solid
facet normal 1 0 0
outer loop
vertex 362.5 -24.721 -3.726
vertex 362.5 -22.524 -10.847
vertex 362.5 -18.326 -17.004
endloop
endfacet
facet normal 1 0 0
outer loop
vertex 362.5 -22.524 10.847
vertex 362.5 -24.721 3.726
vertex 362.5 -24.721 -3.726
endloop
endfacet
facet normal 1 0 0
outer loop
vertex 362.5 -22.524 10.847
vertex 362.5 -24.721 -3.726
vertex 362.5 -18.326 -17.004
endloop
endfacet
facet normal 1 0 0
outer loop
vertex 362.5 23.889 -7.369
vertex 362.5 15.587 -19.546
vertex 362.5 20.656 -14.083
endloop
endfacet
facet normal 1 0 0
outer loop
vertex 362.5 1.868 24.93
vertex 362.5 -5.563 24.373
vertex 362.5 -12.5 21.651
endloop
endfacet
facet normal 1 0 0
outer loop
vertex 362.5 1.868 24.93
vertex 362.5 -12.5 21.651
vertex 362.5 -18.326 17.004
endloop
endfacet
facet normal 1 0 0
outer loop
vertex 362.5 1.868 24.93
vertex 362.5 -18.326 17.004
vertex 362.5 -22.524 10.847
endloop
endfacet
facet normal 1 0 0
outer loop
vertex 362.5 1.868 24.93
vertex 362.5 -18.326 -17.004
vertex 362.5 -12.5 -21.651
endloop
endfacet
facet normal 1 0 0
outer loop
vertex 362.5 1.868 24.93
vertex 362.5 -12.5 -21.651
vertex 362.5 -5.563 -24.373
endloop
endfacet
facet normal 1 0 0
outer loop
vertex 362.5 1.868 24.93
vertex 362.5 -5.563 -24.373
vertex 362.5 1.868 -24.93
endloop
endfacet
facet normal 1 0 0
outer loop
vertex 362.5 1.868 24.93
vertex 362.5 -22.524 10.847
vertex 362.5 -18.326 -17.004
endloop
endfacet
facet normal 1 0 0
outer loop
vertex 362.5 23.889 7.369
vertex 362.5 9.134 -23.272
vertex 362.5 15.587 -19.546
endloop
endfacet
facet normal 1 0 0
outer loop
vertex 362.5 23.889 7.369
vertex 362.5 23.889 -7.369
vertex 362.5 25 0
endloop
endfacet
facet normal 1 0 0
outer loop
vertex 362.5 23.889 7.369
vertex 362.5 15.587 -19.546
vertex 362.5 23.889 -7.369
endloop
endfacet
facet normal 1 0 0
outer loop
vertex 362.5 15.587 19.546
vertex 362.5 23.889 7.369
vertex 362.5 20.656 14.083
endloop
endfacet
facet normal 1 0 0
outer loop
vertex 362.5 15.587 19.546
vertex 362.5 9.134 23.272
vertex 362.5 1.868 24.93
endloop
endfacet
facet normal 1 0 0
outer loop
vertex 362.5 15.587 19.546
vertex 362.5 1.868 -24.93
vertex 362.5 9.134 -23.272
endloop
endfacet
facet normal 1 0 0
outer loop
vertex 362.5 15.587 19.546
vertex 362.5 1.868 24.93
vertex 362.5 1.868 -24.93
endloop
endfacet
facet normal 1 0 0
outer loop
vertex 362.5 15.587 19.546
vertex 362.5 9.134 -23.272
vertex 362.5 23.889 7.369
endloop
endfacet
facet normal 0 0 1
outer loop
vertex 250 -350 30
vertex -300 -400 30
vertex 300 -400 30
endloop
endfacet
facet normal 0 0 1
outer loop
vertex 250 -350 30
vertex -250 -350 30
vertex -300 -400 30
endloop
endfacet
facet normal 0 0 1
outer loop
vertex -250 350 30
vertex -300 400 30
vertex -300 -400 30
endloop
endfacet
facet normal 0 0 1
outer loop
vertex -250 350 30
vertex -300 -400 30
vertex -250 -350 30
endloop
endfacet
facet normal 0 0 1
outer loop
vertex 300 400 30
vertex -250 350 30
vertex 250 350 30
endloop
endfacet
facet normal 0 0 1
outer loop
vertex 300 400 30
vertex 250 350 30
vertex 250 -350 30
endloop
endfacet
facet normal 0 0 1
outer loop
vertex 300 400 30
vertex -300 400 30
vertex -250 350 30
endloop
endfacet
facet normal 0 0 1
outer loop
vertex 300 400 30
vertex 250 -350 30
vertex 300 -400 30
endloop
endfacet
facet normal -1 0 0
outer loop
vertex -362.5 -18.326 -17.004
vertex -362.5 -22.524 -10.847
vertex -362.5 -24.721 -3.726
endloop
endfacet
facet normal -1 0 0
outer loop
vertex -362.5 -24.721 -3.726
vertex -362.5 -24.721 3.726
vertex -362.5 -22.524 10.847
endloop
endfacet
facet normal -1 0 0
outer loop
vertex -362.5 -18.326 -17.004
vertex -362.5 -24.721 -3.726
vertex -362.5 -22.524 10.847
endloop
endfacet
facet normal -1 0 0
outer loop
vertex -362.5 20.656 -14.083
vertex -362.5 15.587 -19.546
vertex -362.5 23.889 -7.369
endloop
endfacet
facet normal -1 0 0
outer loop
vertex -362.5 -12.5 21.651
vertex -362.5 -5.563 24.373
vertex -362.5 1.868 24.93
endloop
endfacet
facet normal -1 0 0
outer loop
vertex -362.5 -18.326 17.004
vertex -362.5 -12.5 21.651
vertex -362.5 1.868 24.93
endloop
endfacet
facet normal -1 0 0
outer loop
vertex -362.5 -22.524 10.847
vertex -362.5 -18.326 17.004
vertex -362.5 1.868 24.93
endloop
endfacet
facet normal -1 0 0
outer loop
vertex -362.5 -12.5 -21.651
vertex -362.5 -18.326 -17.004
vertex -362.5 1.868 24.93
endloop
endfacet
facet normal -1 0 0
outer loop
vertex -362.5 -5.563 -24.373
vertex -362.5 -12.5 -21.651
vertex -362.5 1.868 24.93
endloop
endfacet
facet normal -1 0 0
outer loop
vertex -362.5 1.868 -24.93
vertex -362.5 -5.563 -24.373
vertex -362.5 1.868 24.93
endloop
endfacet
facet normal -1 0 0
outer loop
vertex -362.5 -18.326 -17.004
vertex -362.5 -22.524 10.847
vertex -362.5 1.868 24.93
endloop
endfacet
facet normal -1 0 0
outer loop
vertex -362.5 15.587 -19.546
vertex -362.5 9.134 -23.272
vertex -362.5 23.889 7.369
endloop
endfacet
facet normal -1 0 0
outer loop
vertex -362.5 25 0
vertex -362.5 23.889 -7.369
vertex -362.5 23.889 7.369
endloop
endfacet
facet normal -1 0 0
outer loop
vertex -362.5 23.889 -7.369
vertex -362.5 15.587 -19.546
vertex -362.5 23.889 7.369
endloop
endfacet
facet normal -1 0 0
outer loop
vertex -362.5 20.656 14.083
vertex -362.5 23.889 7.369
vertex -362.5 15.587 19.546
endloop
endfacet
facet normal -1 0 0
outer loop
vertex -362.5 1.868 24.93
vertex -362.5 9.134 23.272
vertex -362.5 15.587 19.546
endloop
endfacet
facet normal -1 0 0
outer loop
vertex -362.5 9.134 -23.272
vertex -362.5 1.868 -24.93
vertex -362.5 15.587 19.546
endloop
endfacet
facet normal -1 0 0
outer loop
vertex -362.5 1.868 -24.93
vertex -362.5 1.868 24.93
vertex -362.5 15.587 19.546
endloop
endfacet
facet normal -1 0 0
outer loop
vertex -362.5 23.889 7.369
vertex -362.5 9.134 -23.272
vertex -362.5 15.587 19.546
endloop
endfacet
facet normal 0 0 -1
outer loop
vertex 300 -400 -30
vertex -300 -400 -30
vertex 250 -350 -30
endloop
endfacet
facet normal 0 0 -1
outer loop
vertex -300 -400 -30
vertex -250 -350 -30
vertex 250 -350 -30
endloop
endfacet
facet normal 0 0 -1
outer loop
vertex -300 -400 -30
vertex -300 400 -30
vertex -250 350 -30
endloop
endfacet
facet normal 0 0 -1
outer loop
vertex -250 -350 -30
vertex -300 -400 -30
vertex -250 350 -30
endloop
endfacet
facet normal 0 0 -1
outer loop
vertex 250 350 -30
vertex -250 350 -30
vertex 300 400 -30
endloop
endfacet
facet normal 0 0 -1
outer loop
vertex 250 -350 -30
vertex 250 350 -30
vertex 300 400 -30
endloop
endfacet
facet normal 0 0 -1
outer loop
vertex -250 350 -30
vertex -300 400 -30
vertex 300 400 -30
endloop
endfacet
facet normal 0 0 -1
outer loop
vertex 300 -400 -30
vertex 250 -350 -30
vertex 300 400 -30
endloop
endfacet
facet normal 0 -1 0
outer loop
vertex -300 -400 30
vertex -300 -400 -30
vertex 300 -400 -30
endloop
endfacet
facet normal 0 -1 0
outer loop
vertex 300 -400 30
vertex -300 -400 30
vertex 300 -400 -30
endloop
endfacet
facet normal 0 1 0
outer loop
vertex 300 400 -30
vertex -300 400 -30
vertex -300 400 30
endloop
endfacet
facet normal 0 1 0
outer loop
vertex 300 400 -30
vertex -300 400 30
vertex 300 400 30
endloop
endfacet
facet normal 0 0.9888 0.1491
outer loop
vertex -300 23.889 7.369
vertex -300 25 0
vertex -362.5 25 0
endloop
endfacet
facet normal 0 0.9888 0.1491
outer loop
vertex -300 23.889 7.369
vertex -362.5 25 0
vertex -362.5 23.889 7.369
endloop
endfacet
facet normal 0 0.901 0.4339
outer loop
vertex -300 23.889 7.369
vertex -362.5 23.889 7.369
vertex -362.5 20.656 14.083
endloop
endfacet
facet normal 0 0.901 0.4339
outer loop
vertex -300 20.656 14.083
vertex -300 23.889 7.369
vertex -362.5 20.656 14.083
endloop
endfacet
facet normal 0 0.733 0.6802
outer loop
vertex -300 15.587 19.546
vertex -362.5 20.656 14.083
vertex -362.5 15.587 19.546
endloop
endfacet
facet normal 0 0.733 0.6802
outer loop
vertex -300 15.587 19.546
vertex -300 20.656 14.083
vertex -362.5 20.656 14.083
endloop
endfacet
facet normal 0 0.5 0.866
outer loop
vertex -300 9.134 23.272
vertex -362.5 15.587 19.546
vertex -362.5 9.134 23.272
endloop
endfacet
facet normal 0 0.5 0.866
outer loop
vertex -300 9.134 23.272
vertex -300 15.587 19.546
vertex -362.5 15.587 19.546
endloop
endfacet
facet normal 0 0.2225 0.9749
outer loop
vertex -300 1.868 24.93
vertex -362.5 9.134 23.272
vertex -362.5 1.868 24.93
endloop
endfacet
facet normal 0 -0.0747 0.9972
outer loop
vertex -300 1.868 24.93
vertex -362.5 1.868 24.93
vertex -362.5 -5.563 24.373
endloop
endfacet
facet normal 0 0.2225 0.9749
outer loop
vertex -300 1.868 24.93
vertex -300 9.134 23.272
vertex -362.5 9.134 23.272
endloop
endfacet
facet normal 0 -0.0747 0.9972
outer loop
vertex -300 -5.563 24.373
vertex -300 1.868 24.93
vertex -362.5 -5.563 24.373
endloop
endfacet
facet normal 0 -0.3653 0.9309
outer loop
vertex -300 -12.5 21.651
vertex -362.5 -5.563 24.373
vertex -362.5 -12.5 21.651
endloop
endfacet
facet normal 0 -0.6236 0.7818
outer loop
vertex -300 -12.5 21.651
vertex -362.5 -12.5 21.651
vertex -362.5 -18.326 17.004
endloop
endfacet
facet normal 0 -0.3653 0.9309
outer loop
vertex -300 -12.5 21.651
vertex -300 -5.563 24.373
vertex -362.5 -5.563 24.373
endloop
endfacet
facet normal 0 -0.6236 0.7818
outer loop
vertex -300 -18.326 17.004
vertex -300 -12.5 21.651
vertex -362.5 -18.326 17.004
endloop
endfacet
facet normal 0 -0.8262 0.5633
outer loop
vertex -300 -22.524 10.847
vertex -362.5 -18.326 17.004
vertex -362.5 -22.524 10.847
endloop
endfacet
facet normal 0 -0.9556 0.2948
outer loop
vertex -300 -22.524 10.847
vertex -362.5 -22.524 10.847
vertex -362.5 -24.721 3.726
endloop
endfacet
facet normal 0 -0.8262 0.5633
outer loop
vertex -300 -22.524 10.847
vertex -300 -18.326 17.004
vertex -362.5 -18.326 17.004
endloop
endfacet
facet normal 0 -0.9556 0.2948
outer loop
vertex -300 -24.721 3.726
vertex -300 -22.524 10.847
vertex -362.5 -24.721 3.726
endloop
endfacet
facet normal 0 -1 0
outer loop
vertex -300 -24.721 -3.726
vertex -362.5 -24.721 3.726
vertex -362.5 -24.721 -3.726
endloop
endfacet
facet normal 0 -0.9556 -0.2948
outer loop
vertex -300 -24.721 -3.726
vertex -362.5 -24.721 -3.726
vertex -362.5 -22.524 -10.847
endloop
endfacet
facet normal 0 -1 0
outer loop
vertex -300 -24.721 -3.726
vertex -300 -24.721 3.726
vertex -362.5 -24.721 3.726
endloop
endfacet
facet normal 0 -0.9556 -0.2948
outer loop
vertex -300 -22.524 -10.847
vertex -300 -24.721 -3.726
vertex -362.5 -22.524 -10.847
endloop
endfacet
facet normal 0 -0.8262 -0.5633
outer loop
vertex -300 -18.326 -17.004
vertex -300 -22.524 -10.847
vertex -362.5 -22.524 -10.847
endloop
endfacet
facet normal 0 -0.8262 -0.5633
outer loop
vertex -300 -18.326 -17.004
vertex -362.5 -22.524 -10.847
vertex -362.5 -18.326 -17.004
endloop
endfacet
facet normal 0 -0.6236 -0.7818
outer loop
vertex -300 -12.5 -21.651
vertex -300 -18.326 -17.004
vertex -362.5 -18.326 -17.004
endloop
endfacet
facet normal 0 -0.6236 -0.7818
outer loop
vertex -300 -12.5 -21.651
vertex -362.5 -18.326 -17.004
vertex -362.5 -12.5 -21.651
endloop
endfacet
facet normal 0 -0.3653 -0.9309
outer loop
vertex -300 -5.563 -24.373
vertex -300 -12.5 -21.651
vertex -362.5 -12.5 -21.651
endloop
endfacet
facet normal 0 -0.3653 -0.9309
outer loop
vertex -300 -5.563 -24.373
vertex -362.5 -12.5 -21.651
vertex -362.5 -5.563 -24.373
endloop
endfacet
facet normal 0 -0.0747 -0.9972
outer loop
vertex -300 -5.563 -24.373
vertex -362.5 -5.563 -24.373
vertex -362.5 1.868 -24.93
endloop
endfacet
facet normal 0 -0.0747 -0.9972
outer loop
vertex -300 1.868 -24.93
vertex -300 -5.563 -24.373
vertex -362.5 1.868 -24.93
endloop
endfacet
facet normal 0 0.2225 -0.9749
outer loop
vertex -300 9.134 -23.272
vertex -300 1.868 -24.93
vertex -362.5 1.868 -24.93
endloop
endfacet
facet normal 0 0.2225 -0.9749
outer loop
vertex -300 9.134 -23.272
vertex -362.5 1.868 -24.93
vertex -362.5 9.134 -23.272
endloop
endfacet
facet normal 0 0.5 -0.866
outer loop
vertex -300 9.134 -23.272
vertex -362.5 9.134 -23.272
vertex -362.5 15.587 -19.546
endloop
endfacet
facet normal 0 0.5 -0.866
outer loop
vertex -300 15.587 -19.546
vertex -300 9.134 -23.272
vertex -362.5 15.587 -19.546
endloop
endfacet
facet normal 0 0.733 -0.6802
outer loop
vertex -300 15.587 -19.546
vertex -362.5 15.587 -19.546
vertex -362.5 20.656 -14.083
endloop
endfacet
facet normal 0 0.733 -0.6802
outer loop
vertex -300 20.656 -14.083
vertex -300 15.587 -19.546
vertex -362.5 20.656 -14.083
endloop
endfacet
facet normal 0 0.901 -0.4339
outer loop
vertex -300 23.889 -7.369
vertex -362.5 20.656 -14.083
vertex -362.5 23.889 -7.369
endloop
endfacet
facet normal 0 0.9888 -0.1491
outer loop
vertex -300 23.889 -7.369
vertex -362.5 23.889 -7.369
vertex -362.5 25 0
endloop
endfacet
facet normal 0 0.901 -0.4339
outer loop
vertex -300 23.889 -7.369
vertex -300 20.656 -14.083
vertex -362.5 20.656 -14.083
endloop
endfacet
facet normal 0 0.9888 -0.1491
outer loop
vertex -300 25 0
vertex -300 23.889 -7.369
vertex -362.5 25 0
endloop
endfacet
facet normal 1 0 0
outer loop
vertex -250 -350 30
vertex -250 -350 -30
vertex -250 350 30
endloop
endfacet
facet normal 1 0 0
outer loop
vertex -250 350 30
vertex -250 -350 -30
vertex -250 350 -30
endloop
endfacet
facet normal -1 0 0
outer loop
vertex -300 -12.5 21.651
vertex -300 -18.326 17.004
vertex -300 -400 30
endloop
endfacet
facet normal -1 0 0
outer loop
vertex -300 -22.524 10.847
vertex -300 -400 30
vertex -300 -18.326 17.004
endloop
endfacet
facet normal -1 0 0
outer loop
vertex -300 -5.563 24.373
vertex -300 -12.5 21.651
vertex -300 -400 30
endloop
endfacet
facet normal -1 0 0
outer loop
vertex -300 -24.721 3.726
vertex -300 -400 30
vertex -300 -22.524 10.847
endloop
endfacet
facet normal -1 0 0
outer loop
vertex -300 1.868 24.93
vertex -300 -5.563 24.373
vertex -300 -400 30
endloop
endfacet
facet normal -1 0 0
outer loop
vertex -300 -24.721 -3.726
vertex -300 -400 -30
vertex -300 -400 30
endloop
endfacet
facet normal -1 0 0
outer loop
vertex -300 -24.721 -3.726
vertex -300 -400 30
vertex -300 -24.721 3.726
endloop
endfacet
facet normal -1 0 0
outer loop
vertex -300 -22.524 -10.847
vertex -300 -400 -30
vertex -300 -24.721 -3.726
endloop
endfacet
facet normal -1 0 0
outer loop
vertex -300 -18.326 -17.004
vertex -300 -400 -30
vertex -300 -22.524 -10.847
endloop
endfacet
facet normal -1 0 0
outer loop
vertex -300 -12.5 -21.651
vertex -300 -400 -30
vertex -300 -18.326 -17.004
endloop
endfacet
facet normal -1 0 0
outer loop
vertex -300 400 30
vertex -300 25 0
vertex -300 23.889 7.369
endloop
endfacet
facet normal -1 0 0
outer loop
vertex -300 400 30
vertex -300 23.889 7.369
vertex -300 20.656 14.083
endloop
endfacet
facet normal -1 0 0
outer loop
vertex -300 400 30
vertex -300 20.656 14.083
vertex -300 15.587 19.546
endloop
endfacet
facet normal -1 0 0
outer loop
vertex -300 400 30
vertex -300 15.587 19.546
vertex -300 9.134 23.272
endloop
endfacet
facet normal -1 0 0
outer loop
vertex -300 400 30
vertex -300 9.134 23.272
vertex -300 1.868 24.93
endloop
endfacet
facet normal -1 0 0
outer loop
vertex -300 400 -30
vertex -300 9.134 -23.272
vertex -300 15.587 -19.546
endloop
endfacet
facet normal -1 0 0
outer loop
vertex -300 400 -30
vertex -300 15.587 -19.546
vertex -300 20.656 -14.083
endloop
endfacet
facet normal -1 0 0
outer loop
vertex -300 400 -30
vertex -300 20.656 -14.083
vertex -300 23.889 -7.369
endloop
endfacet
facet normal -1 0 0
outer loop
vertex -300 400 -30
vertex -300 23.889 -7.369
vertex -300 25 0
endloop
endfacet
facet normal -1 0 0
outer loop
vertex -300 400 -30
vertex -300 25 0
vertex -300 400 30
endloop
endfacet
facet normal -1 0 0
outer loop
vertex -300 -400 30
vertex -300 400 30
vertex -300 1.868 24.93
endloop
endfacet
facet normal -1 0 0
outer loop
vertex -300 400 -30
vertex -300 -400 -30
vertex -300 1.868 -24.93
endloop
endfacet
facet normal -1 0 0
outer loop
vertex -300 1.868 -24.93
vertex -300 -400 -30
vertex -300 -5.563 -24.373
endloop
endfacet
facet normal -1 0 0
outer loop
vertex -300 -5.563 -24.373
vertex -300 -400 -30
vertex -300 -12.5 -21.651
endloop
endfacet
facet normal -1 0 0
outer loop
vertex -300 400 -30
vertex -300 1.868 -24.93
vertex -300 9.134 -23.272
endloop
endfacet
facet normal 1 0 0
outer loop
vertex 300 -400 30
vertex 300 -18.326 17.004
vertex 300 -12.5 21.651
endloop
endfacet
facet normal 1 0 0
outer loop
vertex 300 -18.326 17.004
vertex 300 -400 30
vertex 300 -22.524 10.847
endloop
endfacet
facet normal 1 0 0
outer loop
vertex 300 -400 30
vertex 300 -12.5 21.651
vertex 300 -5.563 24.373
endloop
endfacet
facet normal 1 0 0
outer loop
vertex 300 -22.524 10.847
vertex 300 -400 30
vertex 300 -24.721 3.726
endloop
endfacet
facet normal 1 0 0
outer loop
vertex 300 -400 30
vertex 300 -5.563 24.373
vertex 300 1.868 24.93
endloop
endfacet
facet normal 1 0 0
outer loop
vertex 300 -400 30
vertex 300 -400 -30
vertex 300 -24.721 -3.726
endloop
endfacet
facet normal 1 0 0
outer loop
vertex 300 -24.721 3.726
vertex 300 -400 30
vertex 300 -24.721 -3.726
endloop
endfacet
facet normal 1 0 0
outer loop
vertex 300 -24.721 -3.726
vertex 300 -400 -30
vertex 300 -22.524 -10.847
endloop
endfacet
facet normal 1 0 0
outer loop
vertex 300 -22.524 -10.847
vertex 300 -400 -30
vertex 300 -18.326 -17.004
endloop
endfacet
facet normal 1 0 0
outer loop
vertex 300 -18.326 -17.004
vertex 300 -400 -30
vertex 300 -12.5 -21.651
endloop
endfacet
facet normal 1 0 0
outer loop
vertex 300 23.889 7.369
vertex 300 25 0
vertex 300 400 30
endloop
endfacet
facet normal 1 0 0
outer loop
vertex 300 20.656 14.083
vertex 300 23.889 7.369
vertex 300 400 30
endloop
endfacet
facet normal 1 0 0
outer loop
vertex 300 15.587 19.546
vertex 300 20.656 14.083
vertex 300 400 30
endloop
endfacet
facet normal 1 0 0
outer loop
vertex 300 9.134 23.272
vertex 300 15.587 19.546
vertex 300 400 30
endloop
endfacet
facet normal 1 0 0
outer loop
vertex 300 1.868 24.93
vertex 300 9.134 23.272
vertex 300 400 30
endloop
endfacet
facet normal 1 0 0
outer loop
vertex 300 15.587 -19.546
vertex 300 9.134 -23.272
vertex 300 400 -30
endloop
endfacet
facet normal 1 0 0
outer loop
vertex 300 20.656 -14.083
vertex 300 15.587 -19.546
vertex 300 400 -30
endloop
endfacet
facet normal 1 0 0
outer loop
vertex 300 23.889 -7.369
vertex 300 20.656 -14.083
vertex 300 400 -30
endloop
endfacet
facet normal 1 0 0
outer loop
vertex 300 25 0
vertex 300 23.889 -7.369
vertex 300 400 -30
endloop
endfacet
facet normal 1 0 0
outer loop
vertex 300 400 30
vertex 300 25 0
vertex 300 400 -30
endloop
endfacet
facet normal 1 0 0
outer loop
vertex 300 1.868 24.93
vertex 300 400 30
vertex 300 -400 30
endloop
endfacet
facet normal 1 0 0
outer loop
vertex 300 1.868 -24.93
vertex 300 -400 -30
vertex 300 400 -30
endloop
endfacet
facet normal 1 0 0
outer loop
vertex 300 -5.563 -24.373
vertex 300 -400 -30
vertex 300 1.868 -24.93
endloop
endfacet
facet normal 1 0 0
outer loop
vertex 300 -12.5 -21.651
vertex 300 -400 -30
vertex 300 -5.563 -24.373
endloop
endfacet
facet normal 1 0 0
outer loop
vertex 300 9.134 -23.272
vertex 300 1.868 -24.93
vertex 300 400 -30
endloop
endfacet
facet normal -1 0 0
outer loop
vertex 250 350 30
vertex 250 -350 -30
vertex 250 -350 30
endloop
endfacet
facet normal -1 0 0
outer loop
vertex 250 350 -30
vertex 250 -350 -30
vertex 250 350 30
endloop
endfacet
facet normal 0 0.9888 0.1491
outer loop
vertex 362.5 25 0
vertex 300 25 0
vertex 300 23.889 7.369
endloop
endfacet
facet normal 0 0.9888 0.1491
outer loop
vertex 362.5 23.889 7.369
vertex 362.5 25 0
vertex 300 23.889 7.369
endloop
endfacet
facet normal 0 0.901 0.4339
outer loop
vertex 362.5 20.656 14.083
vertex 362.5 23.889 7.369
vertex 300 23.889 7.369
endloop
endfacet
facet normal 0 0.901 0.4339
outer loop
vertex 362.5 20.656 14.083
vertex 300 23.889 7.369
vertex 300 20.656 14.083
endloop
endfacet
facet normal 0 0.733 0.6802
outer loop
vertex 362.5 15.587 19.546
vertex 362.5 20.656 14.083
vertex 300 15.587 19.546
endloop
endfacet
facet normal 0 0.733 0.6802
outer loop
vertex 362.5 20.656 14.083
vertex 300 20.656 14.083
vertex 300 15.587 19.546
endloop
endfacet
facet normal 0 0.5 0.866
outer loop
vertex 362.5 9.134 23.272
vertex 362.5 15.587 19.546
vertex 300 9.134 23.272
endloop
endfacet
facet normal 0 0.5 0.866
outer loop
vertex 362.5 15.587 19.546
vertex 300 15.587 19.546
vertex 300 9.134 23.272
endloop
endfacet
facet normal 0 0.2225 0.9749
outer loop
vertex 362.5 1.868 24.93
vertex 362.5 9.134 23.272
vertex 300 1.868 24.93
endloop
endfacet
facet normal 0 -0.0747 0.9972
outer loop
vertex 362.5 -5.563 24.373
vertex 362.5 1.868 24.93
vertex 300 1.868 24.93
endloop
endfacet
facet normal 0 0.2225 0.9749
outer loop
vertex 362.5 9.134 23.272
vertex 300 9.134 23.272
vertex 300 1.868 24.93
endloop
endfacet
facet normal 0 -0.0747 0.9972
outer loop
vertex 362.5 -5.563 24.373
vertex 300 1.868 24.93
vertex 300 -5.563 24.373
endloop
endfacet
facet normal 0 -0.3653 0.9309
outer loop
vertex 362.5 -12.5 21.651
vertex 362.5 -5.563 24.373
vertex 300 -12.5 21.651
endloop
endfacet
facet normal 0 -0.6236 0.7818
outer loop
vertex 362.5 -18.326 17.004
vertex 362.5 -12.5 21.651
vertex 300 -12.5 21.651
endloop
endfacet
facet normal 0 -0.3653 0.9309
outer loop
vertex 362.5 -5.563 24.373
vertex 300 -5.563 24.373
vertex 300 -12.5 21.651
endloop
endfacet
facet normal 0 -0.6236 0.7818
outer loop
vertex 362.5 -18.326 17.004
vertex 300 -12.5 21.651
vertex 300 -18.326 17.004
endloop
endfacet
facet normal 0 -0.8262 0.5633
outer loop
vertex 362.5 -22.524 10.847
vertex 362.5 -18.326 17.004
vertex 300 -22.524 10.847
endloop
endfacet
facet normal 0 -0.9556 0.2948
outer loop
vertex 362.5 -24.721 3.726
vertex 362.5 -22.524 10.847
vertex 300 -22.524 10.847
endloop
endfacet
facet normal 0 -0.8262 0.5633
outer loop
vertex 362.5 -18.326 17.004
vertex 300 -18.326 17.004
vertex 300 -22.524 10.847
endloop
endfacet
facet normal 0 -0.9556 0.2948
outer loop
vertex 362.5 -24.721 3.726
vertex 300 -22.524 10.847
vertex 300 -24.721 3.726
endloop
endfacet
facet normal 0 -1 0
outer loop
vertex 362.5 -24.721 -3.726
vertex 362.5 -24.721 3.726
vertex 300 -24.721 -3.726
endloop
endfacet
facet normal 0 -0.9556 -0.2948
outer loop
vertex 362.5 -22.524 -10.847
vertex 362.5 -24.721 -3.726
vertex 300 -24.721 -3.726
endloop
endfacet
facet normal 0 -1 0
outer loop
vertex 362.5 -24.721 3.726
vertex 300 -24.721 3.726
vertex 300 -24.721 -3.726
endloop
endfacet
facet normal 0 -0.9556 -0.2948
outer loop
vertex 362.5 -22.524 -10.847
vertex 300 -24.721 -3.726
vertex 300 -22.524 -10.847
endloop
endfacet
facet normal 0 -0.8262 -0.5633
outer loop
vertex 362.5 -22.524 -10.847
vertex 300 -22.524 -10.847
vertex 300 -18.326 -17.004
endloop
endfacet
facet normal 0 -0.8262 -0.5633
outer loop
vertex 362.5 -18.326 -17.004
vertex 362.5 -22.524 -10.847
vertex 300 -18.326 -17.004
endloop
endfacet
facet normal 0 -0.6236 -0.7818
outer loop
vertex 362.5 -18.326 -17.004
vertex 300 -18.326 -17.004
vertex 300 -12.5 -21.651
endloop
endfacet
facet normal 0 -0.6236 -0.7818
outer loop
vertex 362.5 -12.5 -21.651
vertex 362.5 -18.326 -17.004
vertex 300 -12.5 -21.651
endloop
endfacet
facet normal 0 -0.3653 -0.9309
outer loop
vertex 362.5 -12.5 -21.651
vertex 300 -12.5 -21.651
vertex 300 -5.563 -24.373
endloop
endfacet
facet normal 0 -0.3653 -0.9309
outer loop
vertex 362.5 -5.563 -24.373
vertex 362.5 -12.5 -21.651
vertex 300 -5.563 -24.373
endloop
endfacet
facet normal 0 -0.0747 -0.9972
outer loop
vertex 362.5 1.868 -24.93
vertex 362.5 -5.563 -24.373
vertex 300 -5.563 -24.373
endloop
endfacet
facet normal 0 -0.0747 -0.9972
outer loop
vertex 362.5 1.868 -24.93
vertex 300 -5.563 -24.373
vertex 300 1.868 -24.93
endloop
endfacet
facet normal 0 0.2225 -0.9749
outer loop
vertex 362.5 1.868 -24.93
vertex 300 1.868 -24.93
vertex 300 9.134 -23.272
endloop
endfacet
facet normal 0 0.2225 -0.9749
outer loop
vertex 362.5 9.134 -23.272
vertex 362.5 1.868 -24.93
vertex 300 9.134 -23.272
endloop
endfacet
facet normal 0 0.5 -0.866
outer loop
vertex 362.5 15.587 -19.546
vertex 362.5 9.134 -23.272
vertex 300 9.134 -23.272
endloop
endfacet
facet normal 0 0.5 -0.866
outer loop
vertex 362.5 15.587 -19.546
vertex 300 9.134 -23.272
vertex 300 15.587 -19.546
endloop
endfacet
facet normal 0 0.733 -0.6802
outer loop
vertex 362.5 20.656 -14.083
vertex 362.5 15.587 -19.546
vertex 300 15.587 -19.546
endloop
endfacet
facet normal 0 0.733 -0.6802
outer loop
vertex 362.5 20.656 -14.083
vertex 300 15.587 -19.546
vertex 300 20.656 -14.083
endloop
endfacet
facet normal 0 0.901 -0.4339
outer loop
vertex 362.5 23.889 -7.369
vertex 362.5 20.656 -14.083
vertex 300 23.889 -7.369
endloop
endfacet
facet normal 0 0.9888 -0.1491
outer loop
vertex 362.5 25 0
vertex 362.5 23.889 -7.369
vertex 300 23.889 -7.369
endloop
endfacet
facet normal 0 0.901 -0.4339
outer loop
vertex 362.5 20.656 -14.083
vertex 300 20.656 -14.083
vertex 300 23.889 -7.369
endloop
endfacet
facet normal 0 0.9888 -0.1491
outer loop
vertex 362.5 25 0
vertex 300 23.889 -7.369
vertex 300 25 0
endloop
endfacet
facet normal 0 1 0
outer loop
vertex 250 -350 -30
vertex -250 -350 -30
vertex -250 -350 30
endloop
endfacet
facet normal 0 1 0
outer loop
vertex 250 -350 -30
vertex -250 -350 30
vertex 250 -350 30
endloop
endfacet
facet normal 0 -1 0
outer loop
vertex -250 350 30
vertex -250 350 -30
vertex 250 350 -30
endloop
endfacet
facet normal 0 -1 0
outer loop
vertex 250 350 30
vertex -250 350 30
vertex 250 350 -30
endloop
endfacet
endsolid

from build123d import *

# Parameters (mm, degrees)
BOSS_EXTRUDE1_DEPTH      = 30
BOSS_EXTRUDE1_DEPTH_BACK = 30
SKETCH2_W                = 600
SKETCH2_H                = 800
SKETCH2_W_2              = 500
SKETCH2_H_2              = 700
SKETCH3_R                = 25
BOSS_EXTRUDE2_DEPTH      = 62.5


with BuildPart() as part:
    # Sketch2 → Boss-Extrude1 (new, two sides: drawn at the far end of the back side and taken through both)
    with BuildSketch(Plane.XY.offset(-BOSS_EXTRUDE1_DEPTH_BACK)):
        Rectangle(SKETCH2_W, SKETCH2_H)
        Rectangle(SKETCH2_W_2, SKETCH2_H_2, mode=Mode.SUBTRACT)
    extrude(amount=BOSS_EXTRUDE1_DEPTH + BOSS_EXTRUDE1_DEPTH_BACK)

    # Sketch3 → Boss-Extrude2 (add)
    with BuildSketch(Plane(origin=(300, 0, 0), x_dir=(0, 0, -1), z_dir=(1, 0, 0))):
        Circle(SKETCH3_R)
    boss_extrude2 = extrude(amount=BOSS_EXTRUDE2_DEPTH)

    # Mirror1: Boss-Extrude2 across plane
    add(boss_extrude2.mirror(Plane(origin=(0, 0, 0), x_dir=(0, 0, 1), z_dir=(1, 0, 0))))


solid = part.part
